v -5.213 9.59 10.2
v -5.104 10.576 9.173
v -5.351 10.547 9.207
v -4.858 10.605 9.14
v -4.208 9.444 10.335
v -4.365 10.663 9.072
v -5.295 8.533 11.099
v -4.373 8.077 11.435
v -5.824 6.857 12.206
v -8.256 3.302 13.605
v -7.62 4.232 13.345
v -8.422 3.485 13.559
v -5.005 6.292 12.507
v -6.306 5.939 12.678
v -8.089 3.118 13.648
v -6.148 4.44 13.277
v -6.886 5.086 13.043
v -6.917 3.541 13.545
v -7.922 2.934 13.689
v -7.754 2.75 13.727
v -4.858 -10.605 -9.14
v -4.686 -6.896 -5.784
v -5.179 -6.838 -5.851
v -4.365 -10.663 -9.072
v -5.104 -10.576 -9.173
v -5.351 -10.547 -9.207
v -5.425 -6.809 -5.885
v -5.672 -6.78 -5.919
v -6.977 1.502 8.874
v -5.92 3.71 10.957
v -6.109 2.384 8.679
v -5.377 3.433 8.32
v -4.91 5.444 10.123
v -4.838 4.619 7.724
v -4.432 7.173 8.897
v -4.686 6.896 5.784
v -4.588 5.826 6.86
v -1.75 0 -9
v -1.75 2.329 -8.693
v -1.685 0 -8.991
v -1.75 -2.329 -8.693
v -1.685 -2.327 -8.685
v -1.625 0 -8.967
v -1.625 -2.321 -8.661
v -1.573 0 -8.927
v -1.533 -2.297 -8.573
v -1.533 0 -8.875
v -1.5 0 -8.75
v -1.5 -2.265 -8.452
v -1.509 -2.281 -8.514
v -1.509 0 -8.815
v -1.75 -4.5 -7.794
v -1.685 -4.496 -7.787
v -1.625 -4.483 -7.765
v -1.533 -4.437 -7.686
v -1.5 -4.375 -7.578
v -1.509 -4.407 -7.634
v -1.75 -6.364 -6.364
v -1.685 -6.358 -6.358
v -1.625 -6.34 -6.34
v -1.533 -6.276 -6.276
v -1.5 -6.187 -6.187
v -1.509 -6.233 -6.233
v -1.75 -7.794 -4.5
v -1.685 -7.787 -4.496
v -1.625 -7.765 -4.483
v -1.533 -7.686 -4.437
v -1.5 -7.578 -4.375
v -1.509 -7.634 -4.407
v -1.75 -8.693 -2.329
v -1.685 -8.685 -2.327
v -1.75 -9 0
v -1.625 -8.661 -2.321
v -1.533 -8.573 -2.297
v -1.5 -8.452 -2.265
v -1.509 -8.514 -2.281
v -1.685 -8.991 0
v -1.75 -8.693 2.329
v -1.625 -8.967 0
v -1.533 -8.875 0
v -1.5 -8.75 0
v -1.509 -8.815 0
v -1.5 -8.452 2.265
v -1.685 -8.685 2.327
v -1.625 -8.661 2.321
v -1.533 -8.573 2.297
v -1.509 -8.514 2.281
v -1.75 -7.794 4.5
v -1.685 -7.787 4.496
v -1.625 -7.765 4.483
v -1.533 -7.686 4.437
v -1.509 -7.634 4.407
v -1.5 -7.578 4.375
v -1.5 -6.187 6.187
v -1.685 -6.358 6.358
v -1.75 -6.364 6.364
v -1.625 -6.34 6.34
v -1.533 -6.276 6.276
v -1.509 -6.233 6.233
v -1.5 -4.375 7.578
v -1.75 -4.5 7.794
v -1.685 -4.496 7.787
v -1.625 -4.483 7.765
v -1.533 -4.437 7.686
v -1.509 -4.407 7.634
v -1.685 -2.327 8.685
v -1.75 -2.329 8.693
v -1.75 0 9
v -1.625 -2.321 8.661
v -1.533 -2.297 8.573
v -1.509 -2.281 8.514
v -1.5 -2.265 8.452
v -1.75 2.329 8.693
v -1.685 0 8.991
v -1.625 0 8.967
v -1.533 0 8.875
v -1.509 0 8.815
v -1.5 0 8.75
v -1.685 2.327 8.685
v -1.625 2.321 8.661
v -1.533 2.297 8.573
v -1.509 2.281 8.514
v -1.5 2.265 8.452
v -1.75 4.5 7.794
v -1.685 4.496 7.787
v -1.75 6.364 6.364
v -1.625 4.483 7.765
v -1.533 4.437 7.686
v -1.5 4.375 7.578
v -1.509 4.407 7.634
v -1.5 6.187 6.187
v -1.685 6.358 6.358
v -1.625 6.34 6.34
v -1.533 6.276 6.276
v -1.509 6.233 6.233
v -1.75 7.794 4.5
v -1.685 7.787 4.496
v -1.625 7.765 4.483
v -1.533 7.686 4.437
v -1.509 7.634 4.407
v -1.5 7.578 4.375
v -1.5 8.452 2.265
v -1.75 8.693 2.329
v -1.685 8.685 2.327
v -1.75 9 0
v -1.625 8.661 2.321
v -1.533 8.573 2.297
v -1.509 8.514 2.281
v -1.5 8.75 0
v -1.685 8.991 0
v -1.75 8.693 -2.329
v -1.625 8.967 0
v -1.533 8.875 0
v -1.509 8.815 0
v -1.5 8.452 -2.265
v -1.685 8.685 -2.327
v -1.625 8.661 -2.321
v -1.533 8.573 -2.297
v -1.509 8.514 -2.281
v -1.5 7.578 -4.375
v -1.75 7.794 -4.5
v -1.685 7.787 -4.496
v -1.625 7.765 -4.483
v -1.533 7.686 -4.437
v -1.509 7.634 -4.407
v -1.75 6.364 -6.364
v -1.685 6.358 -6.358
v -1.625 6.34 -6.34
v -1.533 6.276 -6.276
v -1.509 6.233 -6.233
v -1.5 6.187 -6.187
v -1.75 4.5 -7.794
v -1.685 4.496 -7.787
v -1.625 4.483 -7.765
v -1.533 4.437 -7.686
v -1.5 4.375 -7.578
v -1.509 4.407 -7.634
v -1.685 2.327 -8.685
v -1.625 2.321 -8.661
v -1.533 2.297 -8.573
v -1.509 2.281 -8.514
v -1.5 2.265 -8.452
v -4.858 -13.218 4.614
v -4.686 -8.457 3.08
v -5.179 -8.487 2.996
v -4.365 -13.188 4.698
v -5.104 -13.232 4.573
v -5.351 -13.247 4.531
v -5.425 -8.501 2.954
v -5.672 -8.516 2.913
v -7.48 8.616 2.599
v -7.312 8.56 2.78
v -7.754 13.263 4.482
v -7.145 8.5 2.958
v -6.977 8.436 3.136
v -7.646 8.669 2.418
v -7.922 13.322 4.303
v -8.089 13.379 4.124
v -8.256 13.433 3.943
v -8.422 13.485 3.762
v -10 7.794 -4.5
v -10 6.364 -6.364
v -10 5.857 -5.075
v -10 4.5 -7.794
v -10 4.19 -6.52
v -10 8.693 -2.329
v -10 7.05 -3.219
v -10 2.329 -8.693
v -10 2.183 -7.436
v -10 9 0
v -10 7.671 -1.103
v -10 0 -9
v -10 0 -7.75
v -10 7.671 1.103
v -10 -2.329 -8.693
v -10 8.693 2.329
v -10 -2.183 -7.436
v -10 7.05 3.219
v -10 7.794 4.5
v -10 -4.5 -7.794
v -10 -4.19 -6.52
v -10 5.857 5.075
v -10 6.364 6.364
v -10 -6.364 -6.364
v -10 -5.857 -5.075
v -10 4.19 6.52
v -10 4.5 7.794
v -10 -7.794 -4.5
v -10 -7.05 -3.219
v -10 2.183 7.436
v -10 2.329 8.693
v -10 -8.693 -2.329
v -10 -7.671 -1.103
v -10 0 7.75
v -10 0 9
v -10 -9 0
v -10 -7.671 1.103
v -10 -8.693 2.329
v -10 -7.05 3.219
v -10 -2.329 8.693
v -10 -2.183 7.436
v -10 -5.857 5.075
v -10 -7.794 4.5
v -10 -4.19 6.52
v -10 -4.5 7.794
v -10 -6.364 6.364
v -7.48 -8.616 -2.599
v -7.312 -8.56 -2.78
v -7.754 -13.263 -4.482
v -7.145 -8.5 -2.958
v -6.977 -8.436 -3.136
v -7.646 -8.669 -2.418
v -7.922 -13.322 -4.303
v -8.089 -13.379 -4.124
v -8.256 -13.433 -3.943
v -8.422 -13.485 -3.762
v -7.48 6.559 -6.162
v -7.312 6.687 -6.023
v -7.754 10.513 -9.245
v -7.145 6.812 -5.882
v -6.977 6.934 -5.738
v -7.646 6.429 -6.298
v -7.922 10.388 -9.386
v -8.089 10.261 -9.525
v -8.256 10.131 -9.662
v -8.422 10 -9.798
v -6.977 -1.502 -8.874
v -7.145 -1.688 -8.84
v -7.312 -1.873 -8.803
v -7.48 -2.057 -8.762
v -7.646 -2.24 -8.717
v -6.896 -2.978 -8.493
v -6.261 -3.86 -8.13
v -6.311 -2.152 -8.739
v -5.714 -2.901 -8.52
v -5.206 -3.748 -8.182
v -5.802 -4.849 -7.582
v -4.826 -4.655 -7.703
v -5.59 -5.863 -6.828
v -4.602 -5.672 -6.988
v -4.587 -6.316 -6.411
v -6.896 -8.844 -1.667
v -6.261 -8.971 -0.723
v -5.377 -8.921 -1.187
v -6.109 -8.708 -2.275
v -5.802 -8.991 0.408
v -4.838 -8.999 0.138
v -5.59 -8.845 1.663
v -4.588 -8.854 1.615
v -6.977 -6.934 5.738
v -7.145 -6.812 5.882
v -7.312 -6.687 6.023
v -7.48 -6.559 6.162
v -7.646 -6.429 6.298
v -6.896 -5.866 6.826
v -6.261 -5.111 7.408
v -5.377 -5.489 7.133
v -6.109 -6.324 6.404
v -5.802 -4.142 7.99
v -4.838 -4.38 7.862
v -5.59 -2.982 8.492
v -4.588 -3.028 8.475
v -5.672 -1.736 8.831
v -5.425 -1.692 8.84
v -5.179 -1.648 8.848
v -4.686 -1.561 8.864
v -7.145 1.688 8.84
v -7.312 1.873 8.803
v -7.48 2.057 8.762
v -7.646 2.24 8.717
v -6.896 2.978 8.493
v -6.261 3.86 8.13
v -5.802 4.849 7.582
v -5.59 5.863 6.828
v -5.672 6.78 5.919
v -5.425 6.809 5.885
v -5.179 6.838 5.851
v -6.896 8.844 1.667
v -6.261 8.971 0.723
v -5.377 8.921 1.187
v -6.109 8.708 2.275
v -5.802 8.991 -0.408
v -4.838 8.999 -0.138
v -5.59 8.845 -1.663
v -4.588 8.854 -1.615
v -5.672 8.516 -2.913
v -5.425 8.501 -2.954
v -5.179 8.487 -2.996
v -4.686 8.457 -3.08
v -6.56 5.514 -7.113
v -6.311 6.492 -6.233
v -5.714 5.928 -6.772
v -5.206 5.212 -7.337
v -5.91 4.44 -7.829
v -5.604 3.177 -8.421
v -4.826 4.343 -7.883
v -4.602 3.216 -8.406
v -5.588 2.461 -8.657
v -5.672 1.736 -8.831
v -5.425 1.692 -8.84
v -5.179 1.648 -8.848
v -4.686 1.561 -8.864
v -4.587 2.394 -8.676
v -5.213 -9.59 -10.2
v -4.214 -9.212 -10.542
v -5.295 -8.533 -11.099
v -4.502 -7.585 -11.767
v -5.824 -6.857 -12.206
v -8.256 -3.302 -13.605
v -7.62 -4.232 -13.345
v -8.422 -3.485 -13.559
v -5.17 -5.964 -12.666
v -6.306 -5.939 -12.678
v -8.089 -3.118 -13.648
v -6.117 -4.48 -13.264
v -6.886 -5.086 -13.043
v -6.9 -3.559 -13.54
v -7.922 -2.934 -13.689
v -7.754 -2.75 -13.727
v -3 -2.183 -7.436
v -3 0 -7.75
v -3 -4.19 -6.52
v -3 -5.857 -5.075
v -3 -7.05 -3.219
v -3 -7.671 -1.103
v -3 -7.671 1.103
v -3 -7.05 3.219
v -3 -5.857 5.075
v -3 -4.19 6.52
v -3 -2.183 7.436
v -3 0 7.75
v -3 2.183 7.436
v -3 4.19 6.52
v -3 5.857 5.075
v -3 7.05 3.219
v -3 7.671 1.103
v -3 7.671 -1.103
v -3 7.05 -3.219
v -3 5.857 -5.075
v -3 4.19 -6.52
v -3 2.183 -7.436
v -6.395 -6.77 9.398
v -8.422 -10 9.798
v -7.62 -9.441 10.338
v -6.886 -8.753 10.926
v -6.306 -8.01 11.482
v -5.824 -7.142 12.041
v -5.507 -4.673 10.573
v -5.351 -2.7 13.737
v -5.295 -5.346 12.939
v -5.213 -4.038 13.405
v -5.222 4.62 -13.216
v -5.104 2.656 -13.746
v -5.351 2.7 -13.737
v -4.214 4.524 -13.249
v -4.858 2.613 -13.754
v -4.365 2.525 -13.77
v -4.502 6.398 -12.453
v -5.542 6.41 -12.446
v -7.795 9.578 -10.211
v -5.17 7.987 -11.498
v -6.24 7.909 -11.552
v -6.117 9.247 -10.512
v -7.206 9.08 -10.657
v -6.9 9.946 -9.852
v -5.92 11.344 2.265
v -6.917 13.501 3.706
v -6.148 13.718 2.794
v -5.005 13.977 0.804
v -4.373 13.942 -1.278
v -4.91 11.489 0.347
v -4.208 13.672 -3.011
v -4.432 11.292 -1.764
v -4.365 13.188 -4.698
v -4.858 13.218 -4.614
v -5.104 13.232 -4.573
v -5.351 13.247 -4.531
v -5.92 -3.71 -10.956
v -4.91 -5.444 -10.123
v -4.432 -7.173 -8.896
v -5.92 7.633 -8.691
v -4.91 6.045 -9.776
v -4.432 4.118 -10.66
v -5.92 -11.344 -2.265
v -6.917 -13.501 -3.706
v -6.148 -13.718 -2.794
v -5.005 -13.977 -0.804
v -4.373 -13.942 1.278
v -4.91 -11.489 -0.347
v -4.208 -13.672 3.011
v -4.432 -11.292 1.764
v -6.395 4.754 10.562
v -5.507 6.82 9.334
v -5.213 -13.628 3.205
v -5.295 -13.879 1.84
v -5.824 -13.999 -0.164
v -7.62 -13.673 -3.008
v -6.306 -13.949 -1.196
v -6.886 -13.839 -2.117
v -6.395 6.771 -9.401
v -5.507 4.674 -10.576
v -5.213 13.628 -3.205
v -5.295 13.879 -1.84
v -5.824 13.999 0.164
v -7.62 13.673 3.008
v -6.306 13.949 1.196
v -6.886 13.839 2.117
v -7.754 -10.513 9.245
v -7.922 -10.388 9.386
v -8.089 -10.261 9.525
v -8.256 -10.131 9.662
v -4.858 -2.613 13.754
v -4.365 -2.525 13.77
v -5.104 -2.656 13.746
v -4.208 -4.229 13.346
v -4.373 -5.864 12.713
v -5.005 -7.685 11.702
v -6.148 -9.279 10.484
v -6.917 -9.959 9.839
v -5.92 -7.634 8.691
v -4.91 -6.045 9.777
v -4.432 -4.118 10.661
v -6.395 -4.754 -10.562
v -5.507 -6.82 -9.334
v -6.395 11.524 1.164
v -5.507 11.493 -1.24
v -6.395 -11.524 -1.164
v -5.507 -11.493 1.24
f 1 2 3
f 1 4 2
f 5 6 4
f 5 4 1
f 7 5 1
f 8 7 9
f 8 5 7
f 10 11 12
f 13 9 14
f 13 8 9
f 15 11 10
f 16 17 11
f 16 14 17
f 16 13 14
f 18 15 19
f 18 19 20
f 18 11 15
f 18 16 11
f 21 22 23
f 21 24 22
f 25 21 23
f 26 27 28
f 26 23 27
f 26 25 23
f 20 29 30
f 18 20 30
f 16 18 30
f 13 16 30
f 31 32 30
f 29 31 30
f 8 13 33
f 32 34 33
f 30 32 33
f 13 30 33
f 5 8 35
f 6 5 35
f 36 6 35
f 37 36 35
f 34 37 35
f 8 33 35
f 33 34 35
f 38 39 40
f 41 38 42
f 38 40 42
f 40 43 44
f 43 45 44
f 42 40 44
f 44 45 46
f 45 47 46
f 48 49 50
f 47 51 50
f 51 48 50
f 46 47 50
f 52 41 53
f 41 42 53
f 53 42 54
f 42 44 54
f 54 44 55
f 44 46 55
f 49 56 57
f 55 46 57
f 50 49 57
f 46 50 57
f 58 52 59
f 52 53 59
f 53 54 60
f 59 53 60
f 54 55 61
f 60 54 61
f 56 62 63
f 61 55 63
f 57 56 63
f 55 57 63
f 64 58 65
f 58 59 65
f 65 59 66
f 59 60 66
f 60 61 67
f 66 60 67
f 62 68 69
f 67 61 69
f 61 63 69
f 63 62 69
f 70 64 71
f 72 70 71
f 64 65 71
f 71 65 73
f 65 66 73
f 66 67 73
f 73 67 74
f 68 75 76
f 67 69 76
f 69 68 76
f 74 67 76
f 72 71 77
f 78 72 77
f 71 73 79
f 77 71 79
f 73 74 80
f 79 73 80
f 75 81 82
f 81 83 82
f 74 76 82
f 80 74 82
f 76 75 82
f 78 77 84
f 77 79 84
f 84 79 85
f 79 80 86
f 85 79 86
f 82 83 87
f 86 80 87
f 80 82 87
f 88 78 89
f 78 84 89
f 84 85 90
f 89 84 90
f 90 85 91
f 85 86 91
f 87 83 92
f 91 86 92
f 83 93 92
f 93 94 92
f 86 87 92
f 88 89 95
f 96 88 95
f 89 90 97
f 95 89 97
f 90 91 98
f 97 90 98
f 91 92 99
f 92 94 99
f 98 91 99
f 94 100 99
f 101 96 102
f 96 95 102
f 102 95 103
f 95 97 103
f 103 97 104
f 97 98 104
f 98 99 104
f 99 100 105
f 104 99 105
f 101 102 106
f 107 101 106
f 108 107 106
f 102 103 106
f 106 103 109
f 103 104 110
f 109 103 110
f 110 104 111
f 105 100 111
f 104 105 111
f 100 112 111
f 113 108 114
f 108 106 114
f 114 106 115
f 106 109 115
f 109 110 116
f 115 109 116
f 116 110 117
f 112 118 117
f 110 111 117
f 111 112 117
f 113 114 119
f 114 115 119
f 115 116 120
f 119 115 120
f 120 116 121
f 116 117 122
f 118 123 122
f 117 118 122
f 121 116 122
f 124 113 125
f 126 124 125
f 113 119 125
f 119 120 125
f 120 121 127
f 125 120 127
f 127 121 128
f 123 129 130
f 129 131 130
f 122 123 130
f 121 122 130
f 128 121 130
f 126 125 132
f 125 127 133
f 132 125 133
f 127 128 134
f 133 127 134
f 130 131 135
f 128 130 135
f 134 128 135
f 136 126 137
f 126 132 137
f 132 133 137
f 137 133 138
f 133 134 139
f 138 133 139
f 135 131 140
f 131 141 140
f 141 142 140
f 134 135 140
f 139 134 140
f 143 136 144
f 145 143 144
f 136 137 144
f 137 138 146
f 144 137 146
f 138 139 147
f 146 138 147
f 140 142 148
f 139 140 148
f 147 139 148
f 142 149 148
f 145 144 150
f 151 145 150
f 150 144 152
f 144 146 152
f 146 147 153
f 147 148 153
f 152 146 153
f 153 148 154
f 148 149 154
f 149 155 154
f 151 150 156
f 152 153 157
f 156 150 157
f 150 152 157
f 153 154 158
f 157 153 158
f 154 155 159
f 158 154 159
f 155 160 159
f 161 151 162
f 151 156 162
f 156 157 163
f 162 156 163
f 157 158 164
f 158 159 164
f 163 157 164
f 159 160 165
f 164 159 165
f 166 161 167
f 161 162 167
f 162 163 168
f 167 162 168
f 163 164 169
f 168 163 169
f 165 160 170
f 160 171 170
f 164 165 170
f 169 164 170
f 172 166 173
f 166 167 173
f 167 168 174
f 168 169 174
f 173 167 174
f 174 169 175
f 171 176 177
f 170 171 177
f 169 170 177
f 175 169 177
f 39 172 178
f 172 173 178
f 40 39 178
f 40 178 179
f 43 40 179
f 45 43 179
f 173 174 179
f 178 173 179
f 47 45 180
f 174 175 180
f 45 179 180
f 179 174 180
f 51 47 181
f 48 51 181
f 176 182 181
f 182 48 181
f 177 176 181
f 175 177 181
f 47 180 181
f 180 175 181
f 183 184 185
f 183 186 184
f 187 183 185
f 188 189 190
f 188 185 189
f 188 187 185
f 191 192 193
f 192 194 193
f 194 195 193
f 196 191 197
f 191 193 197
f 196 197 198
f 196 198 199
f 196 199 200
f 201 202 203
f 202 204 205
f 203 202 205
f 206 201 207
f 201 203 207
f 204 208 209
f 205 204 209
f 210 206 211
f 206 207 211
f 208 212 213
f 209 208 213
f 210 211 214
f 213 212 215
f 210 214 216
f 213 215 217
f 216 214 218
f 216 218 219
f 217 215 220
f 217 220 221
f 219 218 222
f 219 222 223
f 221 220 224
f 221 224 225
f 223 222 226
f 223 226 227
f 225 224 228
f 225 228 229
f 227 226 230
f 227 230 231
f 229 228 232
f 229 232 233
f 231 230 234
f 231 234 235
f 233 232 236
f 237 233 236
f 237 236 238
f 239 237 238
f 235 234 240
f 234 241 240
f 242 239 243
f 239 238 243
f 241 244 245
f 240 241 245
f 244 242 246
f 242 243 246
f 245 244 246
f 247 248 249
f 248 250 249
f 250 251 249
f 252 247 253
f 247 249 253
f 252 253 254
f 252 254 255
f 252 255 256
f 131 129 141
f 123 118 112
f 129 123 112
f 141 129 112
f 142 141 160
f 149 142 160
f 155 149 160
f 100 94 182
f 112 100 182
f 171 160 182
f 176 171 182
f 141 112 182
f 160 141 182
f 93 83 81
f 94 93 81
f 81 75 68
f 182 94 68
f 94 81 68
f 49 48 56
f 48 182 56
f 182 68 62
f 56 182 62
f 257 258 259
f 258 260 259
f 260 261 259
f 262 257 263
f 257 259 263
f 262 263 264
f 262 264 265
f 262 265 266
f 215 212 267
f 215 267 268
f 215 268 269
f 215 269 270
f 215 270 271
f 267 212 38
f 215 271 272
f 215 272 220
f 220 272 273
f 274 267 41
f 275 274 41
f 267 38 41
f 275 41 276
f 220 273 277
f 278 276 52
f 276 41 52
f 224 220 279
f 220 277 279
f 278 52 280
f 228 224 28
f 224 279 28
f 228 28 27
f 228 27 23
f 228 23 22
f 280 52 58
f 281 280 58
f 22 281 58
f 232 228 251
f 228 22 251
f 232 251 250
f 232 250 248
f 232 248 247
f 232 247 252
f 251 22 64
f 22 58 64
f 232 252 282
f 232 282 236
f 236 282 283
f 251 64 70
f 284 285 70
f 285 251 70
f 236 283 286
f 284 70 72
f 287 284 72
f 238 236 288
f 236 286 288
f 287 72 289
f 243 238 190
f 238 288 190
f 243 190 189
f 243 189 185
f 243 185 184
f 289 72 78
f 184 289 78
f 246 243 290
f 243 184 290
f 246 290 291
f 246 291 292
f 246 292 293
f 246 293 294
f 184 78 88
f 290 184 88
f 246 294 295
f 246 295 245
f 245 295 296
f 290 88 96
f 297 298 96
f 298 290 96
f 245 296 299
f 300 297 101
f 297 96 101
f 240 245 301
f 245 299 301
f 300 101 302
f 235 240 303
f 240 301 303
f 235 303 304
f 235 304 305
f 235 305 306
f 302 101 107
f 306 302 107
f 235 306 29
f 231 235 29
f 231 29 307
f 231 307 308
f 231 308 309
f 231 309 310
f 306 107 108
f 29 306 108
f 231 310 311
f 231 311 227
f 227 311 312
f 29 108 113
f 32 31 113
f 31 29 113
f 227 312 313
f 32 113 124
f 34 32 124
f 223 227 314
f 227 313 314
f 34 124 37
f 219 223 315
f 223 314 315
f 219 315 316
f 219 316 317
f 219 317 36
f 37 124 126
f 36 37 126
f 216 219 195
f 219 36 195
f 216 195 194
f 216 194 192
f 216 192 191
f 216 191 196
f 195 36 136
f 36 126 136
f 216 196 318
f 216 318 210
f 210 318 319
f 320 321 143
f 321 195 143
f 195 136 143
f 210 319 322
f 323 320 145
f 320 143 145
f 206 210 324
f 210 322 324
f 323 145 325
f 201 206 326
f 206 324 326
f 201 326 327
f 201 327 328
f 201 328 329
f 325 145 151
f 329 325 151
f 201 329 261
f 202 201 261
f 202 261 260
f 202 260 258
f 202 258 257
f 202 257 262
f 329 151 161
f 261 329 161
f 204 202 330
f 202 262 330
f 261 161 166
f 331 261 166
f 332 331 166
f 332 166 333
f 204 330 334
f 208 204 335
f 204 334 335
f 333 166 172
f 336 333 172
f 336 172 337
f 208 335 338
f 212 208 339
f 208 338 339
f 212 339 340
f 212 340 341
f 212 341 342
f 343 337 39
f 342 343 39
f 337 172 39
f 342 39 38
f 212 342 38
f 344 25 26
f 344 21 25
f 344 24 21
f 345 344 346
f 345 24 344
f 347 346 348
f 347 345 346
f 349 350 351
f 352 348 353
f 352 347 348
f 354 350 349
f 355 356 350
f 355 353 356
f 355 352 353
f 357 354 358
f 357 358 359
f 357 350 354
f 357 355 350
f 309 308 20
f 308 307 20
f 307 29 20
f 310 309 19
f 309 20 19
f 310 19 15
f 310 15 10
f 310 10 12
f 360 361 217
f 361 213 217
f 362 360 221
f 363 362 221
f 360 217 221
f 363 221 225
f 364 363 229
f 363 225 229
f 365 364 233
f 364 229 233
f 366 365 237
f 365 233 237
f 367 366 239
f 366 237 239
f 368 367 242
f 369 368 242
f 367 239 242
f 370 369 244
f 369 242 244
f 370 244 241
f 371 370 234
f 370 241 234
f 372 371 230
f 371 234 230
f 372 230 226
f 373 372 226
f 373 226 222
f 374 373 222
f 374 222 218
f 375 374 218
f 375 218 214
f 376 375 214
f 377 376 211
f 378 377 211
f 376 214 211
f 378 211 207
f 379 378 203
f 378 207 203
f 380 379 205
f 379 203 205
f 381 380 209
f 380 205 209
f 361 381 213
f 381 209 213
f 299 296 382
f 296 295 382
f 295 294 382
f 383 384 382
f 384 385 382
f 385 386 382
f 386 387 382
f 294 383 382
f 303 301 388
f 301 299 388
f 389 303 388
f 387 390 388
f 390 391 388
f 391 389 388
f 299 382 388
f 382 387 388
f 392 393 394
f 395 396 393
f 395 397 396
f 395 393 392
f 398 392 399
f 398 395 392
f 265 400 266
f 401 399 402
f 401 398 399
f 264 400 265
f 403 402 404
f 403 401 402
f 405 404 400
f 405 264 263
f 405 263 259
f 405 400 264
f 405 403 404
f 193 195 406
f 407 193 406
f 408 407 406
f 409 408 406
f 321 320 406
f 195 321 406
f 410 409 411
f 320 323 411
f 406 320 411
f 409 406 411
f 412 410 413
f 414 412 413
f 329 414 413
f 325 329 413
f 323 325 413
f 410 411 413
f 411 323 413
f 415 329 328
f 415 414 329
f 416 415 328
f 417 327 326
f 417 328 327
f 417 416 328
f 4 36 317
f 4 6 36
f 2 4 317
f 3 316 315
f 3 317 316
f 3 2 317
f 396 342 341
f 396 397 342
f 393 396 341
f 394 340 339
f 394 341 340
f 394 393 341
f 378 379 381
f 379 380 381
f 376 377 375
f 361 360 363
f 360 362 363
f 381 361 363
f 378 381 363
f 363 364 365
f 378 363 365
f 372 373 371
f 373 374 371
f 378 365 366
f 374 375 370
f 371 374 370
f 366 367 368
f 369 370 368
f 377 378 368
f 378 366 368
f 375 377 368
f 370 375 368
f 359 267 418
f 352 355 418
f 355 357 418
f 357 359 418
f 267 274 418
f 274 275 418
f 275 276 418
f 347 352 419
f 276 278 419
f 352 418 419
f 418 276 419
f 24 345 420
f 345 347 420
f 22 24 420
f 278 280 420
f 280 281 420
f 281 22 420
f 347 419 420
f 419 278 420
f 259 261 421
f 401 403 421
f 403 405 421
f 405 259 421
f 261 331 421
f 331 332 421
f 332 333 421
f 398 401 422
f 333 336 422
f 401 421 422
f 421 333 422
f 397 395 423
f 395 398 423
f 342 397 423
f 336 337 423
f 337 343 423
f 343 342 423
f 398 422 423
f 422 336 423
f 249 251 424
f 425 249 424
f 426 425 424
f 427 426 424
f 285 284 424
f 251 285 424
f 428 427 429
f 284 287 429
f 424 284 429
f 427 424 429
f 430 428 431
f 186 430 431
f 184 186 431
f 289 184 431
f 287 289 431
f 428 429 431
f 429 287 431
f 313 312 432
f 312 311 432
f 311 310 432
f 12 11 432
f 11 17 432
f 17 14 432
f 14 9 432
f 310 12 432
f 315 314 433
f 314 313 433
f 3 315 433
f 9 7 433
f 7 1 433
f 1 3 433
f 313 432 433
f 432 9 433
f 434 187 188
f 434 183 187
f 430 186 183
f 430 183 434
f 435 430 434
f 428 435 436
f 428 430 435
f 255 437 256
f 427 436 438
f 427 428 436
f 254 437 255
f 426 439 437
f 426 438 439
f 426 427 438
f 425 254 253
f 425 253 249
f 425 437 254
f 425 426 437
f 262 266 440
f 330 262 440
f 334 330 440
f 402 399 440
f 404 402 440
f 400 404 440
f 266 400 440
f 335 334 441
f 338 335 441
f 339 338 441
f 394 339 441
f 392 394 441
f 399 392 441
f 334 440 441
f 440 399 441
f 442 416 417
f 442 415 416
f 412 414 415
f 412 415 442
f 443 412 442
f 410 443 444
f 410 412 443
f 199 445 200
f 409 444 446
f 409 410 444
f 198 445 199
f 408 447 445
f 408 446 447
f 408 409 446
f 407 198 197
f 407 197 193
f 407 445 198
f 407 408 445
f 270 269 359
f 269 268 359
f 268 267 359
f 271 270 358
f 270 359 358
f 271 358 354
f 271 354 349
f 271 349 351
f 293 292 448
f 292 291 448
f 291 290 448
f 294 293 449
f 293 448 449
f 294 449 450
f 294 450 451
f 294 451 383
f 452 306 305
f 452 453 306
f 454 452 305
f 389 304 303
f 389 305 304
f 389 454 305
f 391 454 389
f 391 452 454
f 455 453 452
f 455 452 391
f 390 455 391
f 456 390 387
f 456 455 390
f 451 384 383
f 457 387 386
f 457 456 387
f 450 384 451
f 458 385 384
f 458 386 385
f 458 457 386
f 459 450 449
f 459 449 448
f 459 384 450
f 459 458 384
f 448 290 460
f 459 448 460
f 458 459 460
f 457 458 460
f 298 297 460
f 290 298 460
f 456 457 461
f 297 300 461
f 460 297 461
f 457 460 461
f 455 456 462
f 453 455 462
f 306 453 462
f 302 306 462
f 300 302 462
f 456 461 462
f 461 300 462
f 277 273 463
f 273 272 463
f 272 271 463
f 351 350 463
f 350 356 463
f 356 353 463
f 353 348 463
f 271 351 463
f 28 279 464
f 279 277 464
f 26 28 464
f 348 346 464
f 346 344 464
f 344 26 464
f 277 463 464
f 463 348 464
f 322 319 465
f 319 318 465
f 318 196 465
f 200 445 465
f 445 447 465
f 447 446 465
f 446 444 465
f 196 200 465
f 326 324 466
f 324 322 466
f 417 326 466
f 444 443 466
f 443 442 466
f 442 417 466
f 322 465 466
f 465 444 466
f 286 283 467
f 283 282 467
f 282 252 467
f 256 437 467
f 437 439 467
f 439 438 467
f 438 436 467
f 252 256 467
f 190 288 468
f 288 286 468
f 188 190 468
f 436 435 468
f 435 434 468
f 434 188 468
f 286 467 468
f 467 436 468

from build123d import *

# Parameters (mm, degrees)
REVOLVE3_ANGLE           = 35
REVOLVE3_OTHER_WAY_ANGLE = 35
CIRPATTERN1_COUNT        = 6
SKETCH8_OUTSIDE_W        = 42.448
SKETCH8_OUTSIDE_H        = 43.096
SKETCH8_OUTSIDE_R        = 14
CUT_EXTRUDE1_DEPTH       = 24.946705857


with BuildPart() as part:
    # Sketch1 → Revolve1 (revolve)
    with BuildSketch(Plane.XY, mode=Mode.PRIVATE) as revolve1_sk:
        with BuildLine():
            Line((-10, 9), (-1.75, 9))
            ThreePointArc((-1.75, 9), (-1.573223305, 8.926776695), (-1.5, 8.75))
            Line((-1.5, 8.75), (-1.5, 0))
            Line((-1.5, 0), (-3, 0))
            Line((-3, 0), (-3, 7.75))
            Line((-3, 7.75), (-10, 7.75))
            Line((-10, 7.75), (-10, 9))
        make_face()
    revolve(revolve1_sk.sketch.rotate(Axis((0, 0, 0), (-1, 0, 0)), 90), axis=Axis((0, 0, 0), (-1, 0, 0)))


with BuildPart() as body_2:
    # Sketch6 → Revolve3 (revolve)
    with BuildSketch(Plane(origin=(-0.750692152, 0.026214748, 2.031649583), x_dir=(-0.9380241231891524, -0.004471483741222242, -0.3465411233149307), z_dir=(0.34656997030213393, -0.01210249004568391, -0.9379460461132464))):
        Polygon((5.267365496, 15.988922273), (4.268057854, 15.951716943), (4.565700491, 7.957255807), (5.565008133, 7.994461136), align=None)
    revolve(axis=Axis((-9.5, 5.745, -1.275), (0.4834449794238033, -0.8545819713199232, 0.18965918423549216)), revolution_arc=REVOLVE3_ANGLE)

    # Sketch6 → Revolve3 other way (revolve)
    with BuildSketch(Plane(origin=(-0.750692152, 0.026214748, 2.031649583), x_dir=(-0.9380241231891524, -0.004471483741222242, -0.3465411233149307), z_dir=(0.34656997030213393, -0.01210249004568391, -0.9379460461132464))):
        Polygon((5.267365496, 15.988922273), (4.268057854, 15.951716943), (4.565700491, 7.957255807), (5.565008133, 7.994461136), align=None)
    revolve(axis=Axis((-9.5, 5.745, -1.275), (-0.4834449794238033, 0.8545819713199232, -0.18965918423549216)), revolution_arc=REVOLVE3_OTHER_WAY_ANGLE)


with BuildPart() as cirpattern1_1:
    # CirPattern1: pattern copy
    add(body_2.part.rotate(Axis((0, 0, 0), (1, 0, 0)), 1 * 360 / CIRPATTERN1_COUNT))


with BuildPart() as cirpattern1_2:
    # CirPattern1: pattern copy
    add(body_2.part.rotate(Axis((0, 0, 0), (1, 0, 0)), 2 * 360 / CIRPATTERN1_COUNT))


with BuildPart() as cirpattern1_3:
    # CirPattern1: pattern copy
    add(body_2.part.rotate(Axis((0, 0, 0), (1, 0, 0)), 3 * 360 / CIRPATTERN1_COUNT))


with BuildPart() as cirpattern1_4:
    # CirPattern1: pattern copy
    add(body_2.part.rotate(Axis((0, 0, 0), (1, 0, 0)), 4 * 360 / CIRPATTERN1_COUNT))


with BuildPart() as cirpattern1_5:
    # CirPattern1: pattern copy
    add(body_2.part.rotate(Axis((0, 0, 0), (1, 0, 0)), 5 * 360 / CIRPATTERN1_COUNT))


with BuildPart() as cirpattern1_3_1:
    add(cirpattern1_3.part)

    # Combine1: union CirPattern1_5, CirPattern1_2, part, CirPattern1_4, body 2, CirPattern1_1
    add(cirpattern1_5.part)
    add(cirpattern1_2.part)
    add(part.part)
    add(cirpattern1_4.part)
    add(body_2.part)
    add(cirpattern1_1.part)

    # Sketch8 outside → Cut-Extrude1 (cut, through all)
    with BuildSketch(Plane(origin=(-1.5, 0, 0), x_dir=(0, 0, -1), z_dir=(1, 0, 0))):
        Rectangle(SKETCH8_OUTSIDE_W, SKETCH8_OUTSIDE_H)
        Circle(SKETCH8_OUTSIDE_R, mode=Mode.SUBTRACT)
    extrude(amount=-CUT_EXTRUDE1_DEPTH, mode=Mode.SUBTRACT)


solid = cirpattern1_3_1.part
